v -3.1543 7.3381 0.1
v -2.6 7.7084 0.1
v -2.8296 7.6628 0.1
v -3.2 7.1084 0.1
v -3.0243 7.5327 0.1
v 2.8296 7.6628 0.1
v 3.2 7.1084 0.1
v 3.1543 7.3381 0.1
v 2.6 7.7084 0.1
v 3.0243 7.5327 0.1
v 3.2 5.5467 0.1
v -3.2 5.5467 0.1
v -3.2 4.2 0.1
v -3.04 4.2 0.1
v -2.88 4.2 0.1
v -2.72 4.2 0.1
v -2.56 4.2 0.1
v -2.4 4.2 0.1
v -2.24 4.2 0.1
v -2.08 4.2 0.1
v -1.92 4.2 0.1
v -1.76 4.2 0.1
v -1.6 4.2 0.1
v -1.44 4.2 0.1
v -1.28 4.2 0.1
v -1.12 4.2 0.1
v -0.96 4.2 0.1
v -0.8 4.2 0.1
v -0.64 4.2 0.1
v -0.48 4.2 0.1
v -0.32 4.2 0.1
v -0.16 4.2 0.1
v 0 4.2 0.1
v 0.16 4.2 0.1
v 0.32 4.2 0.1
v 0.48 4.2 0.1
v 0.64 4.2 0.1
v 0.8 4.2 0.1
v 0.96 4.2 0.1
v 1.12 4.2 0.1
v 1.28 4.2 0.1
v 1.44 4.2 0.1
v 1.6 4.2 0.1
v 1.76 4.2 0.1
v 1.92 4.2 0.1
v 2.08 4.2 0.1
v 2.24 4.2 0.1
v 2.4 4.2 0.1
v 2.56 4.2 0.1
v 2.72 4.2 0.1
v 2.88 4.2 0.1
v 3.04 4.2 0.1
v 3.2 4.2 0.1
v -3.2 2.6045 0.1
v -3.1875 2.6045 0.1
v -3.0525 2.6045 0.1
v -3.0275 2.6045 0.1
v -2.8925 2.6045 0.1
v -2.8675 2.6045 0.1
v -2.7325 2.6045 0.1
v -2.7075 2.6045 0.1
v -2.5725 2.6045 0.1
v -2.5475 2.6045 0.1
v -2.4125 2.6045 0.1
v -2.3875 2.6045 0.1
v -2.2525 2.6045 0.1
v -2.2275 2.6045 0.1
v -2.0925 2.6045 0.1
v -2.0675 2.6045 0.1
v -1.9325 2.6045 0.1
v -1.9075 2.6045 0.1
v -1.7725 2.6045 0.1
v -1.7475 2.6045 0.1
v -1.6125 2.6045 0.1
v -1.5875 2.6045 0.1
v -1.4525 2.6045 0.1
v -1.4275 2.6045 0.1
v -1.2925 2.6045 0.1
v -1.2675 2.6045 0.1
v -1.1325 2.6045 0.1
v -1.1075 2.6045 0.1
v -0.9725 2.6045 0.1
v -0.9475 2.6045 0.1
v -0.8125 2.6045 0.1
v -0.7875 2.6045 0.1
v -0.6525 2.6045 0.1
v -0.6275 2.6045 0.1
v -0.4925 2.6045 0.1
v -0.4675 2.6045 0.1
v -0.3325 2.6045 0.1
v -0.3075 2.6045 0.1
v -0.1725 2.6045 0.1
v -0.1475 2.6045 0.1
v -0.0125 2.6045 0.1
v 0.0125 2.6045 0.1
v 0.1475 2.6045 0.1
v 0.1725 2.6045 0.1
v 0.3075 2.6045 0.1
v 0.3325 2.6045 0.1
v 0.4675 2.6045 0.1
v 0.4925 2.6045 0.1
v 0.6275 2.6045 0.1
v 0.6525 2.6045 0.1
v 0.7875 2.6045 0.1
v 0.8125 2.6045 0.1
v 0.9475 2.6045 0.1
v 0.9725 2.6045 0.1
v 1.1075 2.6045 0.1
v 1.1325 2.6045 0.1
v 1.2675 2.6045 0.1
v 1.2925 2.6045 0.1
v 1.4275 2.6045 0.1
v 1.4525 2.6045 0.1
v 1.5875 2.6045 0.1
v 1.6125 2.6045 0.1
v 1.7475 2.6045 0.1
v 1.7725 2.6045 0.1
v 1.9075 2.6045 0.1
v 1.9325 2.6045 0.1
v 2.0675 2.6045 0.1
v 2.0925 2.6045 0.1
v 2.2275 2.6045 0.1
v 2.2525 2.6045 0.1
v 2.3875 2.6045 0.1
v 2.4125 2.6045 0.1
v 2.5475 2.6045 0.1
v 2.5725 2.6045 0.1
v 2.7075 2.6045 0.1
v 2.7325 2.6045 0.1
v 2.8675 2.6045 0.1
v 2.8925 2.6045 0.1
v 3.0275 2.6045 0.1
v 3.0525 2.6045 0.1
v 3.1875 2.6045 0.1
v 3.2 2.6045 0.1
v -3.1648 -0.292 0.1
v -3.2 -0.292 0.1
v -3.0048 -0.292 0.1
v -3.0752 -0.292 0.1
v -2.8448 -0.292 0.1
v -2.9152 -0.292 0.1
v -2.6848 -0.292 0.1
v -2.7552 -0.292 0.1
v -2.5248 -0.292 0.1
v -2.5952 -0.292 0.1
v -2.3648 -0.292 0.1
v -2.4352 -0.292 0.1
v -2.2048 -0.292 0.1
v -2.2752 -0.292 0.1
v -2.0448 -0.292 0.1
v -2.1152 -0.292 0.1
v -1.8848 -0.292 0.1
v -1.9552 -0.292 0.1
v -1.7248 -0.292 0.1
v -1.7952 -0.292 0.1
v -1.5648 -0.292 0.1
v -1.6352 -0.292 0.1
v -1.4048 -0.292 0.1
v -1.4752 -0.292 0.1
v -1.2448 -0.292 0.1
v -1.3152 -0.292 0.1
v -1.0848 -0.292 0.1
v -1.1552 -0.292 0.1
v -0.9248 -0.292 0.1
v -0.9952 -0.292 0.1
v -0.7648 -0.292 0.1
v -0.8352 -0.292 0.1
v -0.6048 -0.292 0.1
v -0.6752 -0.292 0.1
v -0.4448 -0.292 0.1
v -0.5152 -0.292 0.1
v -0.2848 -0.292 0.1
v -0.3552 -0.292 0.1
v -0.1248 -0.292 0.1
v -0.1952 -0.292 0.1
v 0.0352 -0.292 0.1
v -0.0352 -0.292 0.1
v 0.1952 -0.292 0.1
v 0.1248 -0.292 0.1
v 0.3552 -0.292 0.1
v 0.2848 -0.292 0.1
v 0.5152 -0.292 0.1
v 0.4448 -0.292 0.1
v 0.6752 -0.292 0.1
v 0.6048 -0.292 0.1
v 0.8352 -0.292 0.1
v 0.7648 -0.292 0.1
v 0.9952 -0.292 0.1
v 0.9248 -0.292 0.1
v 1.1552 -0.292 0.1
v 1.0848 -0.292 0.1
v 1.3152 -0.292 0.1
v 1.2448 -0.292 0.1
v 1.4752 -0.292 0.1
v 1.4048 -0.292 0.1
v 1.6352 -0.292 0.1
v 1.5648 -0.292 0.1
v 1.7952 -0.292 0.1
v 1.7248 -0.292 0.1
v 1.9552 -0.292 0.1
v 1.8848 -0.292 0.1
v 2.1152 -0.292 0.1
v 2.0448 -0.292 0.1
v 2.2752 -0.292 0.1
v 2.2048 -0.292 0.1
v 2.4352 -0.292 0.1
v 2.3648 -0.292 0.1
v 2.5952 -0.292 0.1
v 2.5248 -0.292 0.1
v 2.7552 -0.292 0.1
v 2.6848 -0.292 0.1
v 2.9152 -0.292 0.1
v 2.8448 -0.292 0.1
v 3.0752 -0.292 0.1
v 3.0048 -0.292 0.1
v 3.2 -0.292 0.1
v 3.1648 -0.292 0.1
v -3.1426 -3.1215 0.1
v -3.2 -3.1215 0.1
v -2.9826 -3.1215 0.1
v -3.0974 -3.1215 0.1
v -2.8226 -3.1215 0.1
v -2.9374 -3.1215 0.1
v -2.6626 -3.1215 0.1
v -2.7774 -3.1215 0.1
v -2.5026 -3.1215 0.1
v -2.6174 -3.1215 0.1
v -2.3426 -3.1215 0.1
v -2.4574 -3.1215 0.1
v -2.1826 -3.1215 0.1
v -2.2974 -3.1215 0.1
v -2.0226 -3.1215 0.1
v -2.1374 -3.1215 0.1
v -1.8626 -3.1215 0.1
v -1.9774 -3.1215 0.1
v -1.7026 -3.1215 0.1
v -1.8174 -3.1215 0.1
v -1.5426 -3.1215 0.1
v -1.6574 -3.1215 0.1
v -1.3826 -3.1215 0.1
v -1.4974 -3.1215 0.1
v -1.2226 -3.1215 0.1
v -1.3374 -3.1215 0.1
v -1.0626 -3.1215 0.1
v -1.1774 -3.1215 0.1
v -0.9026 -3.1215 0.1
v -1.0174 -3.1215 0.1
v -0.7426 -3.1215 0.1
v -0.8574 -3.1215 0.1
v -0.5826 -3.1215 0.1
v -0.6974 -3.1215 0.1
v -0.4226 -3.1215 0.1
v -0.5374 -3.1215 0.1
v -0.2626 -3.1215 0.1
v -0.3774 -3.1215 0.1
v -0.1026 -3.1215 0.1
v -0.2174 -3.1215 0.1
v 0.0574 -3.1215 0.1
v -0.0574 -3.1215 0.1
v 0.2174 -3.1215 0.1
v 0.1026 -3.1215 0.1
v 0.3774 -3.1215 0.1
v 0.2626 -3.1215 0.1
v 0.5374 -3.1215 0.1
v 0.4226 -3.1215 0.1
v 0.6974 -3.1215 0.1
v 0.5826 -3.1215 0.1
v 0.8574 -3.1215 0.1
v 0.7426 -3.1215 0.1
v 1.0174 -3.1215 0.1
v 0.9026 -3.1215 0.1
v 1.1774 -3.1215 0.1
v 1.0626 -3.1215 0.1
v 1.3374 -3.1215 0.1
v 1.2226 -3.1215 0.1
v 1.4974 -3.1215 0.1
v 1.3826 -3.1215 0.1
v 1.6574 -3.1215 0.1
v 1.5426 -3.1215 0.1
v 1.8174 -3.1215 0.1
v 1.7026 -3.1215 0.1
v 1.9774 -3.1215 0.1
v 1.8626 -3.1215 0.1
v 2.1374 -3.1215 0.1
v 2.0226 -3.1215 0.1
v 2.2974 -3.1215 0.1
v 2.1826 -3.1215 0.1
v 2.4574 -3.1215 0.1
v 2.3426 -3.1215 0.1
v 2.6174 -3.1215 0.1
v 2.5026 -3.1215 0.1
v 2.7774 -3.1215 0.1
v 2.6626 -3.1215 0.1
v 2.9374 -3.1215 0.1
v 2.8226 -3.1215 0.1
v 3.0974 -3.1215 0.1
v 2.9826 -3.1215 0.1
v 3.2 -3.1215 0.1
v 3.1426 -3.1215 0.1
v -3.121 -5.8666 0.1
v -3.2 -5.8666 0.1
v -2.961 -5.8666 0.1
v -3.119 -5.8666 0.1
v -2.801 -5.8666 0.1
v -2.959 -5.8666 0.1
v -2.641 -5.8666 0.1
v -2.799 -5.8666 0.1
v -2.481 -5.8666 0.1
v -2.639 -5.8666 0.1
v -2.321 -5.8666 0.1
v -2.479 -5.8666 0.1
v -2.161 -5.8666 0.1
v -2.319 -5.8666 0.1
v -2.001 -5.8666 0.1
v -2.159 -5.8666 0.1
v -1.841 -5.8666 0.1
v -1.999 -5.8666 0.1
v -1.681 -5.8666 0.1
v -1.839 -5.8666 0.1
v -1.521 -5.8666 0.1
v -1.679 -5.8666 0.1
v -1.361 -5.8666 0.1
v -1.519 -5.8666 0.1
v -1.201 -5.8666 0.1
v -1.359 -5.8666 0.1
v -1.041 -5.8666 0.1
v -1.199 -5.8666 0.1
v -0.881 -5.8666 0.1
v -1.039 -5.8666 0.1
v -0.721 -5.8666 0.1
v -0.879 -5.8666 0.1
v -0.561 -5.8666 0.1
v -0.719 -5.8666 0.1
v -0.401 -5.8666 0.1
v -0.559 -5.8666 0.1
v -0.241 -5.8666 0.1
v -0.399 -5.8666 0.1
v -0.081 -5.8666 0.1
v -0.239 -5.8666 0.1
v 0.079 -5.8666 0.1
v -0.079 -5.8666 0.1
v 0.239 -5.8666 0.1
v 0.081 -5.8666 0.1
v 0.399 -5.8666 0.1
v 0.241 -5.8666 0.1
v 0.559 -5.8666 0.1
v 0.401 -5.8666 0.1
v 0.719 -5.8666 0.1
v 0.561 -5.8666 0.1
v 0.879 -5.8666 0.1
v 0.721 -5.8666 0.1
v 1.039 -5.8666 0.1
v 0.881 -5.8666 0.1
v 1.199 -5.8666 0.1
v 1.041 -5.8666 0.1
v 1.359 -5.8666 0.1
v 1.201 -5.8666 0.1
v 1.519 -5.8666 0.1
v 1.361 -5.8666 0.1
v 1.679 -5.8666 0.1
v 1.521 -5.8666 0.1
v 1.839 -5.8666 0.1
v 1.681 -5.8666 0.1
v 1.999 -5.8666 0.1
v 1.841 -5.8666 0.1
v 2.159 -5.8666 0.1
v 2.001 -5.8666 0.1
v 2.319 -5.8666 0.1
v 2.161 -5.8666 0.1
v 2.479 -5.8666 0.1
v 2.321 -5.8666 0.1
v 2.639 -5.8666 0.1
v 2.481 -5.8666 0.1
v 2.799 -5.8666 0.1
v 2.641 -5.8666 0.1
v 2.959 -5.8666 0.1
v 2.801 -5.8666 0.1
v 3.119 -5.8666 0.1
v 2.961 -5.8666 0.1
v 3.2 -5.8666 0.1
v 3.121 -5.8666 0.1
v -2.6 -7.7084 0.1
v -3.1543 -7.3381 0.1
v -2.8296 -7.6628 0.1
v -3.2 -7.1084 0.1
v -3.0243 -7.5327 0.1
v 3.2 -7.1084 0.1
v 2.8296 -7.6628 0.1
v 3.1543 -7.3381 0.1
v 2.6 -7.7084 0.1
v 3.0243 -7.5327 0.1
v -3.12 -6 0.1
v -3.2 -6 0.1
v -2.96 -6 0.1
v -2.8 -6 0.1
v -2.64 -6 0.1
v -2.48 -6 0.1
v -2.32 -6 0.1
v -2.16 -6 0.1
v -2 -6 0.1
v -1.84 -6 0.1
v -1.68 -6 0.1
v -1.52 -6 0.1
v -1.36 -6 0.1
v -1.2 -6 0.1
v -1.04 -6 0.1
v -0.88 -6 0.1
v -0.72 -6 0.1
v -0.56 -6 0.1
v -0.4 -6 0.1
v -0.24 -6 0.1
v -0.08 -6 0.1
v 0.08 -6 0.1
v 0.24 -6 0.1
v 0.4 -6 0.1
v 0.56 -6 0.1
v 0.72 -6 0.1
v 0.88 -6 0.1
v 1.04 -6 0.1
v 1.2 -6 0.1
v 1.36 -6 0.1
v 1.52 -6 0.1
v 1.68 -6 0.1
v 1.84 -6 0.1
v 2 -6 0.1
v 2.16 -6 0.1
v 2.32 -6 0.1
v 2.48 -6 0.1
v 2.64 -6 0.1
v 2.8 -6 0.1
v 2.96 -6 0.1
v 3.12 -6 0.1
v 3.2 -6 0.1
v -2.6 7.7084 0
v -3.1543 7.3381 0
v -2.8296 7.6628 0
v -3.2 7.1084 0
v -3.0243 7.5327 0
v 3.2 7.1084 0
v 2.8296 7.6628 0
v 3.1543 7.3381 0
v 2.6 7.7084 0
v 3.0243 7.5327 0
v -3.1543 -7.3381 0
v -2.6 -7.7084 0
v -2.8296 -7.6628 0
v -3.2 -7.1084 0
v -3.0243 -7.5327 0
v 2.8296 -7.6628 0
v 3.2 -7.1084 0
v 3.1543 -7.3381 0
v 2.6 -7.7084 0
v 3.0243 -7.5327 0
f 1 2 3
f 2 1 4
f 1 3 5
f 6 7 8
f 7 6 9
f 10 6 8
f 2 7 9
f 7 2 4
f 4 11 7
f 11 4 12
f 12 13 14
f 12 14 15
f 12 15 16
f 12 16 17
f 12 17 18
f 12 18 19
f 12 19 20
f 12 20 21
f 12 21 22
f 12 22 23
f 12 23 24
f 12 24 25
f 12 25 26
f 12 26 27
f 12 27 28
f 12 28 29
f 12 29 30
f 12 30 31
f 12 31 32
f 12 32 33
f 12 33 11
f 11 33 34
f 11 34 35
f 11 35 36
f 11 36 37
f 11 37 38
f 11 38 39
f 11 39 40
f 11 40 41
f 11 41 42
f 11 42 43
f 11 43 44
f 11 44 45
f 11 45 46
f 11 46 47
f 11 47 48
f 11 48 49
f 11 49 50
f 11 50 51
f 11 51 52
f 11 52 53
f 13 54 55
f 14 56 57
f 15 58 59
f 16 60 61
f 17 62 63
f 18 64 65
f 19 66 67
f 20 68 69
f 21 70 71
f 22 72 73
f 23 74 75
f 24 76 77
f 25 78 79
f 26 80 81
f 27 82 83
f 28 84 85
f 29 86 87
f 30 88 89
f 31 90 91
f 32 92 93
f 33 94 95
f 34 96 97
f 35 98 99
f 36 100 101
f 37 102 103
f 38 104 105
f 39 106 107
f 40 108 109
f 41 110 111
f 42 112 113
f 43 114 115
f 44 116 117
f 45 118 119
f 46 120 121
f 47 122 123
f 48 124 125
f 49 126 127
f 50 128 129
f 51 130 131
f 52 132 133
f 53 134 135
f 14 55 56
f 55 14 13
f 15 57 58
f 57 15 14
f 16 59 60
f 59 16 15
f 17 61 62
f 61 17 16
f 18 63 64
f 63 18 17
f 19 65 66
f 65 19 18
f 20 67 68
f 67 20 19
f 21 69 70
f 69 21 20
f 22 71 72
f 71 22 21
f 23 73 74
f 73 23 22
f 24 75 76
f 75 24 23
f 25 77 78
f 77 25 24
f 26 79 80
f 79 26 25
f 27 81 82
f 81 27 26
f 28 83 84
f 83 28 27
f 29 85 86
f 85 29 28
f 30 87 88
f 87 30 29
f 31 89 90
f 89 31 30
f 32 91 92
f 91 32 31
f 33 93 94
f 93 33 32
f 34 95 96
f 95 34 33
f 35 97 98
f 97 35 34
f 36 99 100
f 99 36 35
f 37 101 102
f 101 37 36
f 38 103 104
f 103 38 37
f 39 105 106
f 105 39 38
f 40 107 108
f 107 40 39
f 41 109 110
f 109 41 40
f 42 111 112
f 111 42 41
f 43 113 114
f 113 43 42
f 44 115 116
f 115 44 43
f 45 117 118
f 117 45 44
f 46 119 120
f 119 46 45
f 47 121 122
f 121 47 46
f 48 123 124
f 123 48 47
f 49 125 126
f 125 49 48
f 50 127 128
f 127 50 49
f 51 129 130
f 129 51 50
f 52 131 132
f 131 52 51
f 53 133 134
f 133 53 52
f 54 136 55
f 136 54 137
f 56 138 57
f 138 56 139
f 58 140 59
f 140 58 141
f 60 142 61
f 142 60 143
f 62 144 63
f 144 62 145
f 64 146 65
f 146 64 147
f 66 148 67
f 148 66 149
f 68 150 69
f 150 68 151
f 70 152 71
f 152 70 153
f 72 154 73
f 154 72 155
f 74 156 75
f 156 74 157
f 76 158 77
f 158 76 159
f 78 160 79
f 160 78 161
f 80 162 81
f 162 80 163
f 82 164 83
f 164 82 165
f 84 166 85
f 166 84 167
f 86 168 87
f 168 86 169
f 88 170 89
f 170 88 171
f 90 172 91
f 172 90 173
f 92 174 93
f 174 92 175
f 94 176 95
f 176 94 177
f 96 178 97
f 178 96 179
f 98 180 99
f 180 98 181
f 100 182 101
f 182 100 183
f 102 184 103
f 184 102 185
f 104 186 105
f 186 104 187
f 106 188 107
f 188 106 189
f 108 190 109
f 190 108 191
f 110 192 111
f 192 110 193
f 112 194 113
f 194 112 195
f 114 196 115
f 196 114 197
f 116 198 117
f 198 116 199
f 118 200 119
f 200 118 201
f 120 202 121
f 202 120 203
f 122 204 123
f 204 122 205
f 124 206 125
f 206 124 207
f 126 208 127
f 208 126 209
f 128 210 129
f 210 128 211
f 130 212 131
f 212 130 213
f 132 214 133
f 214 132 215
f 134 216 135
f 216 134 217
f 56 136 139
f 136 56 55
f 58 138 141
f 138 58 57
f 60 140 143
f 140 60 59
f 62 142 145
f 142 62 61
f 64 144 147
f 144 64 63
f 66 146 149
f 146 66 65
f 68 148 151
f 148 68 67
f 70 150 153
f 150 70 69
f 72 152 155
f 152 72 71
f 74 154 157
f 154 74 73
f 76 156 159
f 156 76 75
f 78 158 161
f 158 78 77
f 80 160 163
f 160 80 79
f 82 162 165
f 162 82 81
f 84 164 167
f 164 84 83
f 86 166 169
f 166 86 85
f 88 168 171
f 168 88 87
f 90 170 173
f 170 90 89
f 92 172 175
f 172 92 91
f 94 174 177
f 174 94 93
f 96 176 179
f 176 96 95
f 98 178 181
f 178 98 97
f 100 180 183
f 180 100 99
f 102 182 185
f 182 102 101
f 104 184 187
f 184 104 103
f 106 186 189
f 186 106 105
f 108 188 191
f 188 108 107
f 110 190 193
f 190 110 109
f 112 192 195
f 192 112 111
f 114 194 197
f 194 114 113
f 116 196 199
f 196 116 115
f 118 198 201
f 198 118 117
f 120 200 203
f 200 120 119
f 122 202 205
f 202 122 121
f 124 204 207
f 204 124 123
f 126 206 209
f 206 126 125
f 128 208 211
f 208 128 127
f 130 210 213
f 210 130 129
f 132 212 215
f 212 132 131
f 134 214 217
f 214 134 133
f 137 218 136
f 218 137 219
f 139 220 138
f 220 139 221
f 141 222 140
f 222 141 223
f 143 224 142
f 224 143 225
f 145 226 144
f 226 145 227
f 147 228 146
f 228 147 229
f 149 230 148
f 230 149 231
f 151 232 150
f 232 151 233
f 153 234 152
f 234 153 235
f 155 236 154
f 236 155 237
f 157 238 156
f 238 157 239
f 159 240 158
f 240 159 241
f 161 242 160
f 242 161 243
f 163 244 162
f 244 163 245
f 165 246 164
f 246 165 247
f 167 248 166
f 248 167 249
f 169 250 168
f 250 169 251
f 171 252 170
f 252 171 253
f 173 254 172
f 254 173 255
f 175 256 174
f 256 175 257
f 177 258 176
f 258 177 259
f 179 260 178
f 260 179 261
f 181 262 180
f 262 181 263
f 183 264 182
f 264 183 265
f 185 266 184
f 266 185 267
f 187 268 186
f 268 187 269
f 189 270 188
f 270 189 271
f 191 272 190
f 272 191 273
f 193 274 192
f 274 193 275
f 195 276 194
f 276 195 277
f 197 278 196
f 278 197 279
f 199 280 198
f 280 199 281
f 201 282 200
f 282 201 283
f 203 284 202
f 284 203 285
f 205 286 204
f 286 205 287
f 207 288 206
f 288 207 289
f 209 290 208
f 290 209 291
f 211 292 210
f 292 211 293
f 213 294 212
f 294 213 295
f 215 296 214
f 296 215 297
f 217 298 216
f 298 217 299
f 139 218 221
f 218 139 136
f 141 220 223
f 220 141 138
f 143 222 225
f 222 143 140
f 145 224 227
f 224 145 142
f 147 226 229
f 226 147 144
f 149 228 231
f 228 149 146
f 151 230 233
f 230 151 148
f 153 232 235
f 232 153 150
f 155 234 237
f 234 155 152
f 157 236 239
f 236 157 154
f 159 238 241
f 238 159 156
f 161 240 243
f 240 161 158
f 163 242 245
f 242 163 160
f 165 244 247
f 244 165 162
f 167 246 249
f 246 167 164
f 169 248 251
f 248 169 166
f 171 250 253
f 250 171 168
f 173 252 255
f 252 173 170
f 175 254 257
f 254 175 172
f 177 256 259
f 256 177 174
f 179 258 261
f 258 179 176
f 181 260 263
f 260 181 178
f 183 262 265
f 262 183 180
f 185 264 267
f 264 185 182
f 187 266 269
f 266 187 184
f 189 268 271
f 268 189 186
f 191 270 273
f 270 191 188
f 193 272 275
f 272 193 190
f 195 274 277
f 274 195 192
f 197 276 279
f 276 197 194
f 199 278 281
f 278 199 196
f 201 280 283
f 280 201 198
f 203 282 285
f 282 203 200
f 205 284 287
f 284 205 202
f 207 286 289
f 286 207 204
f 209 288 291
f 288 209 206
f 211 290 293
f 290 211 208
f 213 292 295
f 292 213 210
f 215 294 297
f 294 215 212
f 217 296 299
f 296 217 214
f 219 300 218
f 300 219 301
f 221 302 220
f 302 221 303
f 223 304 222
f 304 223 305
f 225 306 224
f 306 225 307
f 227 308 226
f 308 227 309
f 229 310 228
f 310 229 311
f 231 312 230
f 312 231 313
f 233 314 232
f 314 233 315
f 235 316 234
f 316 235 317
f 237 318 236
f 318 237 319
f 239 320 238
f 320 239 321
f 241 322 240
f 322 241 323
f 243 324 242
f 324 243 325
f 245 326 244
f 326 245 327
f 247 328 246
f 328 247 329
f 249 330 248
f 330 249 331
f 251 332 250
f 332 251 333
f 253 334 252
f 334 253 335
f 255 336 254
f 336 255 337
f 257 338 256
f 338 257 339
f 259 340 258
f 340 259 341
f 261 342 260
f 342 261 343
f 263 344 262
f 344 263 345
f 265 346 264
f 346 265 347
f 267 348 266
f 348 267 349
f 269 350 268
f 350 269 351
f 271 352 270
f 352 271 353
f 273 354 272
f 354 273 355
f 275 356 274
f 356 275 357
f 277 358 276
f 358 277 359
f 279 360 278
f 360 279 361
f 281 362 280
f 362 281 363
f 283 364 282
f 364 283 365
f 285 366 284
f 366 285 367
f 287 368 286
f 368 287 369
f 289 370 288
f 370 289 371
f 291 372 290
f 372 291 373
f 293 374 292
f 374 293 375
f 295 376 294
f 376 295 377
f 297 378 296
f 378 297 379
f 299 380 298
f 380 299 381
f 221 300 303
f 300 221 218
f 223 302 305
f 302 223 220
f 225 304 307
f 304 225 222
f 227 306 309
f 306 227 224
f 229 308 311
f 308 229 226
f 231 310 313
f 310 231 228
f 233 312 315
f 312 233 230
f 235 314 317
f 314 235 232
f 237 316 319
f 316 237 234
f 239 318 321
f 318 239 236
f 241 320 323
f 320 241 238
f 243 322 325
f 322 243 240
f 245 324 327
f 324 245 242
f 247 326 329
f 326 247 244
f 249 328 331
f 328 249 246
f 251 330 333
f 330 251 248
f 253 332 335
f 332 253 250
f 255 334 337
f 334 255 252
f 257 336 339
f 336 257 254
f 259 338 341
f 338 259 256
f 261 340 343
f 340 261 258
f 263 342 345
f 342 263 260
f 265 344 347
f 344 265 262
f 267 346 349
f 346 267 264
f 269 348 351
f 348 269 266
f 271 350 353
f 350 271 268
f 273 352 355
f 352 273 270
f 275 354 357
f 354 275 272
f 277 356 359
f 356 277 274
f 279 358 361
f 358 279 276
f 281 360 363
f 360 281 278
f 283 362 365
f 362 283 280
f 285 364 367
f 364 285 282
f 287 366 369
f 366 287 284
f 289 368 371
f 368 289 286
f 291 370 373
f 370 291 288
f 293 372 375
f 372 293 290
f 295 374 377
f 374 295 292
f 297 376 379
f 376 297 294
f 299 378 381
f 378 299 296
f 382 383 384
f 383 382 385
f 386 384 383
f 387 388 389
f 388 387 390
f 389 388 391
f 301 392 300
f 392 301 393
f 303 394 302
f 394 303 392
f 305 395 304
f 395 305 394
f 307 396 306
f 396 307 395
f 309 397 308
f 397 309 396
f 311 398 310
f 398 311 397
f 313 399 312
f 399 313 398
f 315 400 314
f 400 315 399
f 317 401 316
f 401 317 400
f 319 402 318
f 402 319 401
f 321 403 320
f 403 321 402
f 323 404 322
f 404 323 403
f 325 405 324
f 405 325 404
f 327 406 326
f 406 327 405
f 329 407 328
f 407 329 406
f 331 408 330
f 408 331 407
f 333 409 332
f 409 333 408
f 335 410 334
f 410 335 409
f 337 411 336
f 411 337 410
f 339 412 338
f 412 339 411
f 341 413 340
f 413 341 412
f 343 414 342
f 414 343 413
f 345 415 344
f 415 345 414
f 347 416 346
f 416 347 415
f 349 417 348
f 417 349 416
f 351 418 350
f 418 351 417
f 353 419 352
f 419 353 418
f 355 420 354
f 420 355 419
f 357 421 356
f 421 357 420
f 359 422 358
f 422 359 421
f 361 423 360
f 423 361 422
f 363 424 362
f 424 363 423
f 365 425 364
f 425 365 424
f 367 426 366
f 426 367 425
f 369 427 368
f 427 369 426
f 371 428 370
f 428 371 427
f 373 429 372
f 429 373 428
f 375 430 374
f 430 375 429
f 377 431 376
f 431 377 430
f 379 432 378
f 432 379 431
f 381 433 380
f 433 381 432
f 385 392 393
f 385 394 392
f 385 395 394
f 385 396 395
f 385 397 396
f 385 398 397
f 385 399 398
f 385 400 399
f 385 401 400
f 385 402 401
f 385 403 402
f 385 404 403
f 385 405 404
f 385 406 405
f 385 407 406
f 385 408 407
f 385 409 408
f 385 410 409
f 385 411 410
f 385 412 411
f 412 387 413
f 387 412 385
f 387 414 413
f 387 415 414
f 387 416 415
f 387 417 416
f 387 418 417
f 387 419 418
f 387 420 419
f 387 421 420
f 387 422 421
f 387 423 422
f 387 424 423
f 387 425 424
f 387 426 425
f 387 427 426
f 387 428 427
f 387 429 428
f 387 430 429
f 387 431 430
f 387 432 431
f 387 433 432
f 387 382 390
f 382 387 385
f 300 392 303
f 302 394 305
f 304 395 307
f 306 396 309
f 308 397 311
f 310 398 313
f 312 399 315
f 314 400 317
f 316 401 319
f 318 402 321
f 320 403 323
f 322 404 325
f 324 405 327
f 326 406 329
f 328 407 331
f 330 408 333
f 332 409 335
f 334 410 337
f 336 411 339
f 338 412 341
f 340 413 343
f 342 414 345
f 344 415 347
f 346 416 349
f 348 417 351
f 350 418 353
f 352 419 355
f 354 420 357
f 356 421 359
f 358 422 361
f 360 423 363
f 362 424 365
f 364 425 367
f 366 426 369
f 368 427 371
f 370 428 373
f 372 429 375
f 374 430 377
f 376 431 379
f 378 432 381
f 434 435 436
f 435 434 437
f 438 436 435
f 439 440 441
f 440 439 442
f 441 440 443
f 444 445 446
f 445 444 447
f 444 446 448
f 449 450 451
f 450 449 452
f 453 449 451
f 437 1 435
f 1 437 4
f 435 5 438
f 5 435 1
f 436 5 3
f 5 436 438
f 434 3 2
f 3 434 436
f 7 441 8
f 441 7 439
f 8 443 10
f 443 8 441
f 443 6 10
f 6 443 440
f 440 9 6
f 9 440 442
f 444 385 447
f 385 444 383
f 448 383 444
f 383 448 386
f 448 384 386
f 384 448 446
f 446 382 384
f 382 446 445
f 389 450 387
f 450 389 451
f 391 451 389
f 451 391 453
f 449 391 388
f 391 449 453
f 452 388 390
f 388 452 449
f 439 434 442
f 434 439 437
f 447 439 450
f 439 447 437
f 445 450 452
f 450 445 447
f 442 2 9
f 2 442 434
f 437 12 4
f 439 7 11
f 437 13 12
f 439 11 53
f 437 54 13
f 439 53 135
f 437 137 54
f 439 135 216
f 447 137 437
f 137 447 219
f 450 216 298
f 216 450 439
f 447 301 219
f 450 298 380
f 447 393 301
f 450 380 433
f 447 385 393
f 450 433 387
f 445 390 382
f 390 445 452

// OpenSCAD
use <../lib.scad>
use <s/6142275qs01.scad>
use <s/6142275qs02.scad>
use <s/6142275qs03.scad>
use <s/6142275qs04.scad>
use <s/6142275qs05.scad>
use <s/6142275qs06.scad>
use <s/6142275qs07.scad>
function ldraw_lib__6142275q() = [
// 0 Sticker  1.9 x  0.8 with Black and Dark Grey Face (Needs Work)
// 0 Name: 6142275q.dat
// 0 Author: Massimo Maso [Sirio]
// 0 !LDRAW_ORG Part UPDATE 2023-06
// 0 !LICENSE Licensed under CC BY 4.0 : see CAreadme.txt
// 
// 0 !HELP Needs work: it requires a texture for the gradient on the top face
// 
// 0 BFC CERTIFY CCW
  [0,"BFC","CERTIFY"],
  [0,"BFC","CCW"],
// 
// 0 !KEYWORDS Audi, e-tron, quattro, R18, Set 75872, Speed Champions
// 
// 0 !HISTORY 2023-11-19 [OrionP] Official Update 2023-06
// 
// 
// 1 16 0 0 13.8789 1 0 0 0 1 0 0 0 1 s\6142275qs01.dat
  [1,16,0,0,13.8789,1,0,0,0,1,0,0,0,1, ldraw_lib__s__6142275qs01()],
// 1 16 0 0 13.8547 1 0 0 0 1 0 0 0 1 s\6142275qs02.dat
  [1,16,0,0,13.8547,1,0,0,0,1,0,0,0,1, ldraw_lib__s__6142275qs02()],
// 1 16 0 0 -.7172 1 0 0 0 1 0 0 0 1 s\6142275qs03.dat
  [1,16,0,0,-.7172,1,0,0,0,1,0,0,0,1, ldraw_lib__s__6142275qs03()],
// 1 16 0 0 -.7428 1 0 0 0 1 0 0 0 1 s\6142275qs04.dat
  [1,16,0,0,-.7428,1,0,0,0,1,0,0,0,1, ldraw_lib__s__6142275qs04()],
// 1 16 0 0 -14.6522 1 0 0 0 1 0 0 0 1 s\6142275qs05.dat
  [1,16,0,0,-14.6522,1,0,0,0,1,0,0,0,1, ldraw_lib__s__6142275qs05()],
// 1 16 0 0 -14.6810 1 0 0 0 1 0 0 0 1 s\6142275qs06.dat
  [1,16,0,0,-14.6810,1,0,0,0,1,0,0,0,1, ldraw_lib__s__6142275qs06()],
// 1 16 0 0 0 1 0 0 0 1 0 0 0 1 s\6142275qs07.dat
  [1,16,0,0,0,1,0,0,0,1,0,0,0,1, ldraw_lib__s__6142275qs07()],
];
module ldraw_lib__6142275q(step=0, col=false, unit=2/5, alt=false, line=0.2, solid=!$preview)
    makepoly(ldraw_lib__6142275q(), step=step, col=col, unit=unit, alt=alt, line=line, solid=solid);
ldraw_lib__6142275q(line=0.2);
